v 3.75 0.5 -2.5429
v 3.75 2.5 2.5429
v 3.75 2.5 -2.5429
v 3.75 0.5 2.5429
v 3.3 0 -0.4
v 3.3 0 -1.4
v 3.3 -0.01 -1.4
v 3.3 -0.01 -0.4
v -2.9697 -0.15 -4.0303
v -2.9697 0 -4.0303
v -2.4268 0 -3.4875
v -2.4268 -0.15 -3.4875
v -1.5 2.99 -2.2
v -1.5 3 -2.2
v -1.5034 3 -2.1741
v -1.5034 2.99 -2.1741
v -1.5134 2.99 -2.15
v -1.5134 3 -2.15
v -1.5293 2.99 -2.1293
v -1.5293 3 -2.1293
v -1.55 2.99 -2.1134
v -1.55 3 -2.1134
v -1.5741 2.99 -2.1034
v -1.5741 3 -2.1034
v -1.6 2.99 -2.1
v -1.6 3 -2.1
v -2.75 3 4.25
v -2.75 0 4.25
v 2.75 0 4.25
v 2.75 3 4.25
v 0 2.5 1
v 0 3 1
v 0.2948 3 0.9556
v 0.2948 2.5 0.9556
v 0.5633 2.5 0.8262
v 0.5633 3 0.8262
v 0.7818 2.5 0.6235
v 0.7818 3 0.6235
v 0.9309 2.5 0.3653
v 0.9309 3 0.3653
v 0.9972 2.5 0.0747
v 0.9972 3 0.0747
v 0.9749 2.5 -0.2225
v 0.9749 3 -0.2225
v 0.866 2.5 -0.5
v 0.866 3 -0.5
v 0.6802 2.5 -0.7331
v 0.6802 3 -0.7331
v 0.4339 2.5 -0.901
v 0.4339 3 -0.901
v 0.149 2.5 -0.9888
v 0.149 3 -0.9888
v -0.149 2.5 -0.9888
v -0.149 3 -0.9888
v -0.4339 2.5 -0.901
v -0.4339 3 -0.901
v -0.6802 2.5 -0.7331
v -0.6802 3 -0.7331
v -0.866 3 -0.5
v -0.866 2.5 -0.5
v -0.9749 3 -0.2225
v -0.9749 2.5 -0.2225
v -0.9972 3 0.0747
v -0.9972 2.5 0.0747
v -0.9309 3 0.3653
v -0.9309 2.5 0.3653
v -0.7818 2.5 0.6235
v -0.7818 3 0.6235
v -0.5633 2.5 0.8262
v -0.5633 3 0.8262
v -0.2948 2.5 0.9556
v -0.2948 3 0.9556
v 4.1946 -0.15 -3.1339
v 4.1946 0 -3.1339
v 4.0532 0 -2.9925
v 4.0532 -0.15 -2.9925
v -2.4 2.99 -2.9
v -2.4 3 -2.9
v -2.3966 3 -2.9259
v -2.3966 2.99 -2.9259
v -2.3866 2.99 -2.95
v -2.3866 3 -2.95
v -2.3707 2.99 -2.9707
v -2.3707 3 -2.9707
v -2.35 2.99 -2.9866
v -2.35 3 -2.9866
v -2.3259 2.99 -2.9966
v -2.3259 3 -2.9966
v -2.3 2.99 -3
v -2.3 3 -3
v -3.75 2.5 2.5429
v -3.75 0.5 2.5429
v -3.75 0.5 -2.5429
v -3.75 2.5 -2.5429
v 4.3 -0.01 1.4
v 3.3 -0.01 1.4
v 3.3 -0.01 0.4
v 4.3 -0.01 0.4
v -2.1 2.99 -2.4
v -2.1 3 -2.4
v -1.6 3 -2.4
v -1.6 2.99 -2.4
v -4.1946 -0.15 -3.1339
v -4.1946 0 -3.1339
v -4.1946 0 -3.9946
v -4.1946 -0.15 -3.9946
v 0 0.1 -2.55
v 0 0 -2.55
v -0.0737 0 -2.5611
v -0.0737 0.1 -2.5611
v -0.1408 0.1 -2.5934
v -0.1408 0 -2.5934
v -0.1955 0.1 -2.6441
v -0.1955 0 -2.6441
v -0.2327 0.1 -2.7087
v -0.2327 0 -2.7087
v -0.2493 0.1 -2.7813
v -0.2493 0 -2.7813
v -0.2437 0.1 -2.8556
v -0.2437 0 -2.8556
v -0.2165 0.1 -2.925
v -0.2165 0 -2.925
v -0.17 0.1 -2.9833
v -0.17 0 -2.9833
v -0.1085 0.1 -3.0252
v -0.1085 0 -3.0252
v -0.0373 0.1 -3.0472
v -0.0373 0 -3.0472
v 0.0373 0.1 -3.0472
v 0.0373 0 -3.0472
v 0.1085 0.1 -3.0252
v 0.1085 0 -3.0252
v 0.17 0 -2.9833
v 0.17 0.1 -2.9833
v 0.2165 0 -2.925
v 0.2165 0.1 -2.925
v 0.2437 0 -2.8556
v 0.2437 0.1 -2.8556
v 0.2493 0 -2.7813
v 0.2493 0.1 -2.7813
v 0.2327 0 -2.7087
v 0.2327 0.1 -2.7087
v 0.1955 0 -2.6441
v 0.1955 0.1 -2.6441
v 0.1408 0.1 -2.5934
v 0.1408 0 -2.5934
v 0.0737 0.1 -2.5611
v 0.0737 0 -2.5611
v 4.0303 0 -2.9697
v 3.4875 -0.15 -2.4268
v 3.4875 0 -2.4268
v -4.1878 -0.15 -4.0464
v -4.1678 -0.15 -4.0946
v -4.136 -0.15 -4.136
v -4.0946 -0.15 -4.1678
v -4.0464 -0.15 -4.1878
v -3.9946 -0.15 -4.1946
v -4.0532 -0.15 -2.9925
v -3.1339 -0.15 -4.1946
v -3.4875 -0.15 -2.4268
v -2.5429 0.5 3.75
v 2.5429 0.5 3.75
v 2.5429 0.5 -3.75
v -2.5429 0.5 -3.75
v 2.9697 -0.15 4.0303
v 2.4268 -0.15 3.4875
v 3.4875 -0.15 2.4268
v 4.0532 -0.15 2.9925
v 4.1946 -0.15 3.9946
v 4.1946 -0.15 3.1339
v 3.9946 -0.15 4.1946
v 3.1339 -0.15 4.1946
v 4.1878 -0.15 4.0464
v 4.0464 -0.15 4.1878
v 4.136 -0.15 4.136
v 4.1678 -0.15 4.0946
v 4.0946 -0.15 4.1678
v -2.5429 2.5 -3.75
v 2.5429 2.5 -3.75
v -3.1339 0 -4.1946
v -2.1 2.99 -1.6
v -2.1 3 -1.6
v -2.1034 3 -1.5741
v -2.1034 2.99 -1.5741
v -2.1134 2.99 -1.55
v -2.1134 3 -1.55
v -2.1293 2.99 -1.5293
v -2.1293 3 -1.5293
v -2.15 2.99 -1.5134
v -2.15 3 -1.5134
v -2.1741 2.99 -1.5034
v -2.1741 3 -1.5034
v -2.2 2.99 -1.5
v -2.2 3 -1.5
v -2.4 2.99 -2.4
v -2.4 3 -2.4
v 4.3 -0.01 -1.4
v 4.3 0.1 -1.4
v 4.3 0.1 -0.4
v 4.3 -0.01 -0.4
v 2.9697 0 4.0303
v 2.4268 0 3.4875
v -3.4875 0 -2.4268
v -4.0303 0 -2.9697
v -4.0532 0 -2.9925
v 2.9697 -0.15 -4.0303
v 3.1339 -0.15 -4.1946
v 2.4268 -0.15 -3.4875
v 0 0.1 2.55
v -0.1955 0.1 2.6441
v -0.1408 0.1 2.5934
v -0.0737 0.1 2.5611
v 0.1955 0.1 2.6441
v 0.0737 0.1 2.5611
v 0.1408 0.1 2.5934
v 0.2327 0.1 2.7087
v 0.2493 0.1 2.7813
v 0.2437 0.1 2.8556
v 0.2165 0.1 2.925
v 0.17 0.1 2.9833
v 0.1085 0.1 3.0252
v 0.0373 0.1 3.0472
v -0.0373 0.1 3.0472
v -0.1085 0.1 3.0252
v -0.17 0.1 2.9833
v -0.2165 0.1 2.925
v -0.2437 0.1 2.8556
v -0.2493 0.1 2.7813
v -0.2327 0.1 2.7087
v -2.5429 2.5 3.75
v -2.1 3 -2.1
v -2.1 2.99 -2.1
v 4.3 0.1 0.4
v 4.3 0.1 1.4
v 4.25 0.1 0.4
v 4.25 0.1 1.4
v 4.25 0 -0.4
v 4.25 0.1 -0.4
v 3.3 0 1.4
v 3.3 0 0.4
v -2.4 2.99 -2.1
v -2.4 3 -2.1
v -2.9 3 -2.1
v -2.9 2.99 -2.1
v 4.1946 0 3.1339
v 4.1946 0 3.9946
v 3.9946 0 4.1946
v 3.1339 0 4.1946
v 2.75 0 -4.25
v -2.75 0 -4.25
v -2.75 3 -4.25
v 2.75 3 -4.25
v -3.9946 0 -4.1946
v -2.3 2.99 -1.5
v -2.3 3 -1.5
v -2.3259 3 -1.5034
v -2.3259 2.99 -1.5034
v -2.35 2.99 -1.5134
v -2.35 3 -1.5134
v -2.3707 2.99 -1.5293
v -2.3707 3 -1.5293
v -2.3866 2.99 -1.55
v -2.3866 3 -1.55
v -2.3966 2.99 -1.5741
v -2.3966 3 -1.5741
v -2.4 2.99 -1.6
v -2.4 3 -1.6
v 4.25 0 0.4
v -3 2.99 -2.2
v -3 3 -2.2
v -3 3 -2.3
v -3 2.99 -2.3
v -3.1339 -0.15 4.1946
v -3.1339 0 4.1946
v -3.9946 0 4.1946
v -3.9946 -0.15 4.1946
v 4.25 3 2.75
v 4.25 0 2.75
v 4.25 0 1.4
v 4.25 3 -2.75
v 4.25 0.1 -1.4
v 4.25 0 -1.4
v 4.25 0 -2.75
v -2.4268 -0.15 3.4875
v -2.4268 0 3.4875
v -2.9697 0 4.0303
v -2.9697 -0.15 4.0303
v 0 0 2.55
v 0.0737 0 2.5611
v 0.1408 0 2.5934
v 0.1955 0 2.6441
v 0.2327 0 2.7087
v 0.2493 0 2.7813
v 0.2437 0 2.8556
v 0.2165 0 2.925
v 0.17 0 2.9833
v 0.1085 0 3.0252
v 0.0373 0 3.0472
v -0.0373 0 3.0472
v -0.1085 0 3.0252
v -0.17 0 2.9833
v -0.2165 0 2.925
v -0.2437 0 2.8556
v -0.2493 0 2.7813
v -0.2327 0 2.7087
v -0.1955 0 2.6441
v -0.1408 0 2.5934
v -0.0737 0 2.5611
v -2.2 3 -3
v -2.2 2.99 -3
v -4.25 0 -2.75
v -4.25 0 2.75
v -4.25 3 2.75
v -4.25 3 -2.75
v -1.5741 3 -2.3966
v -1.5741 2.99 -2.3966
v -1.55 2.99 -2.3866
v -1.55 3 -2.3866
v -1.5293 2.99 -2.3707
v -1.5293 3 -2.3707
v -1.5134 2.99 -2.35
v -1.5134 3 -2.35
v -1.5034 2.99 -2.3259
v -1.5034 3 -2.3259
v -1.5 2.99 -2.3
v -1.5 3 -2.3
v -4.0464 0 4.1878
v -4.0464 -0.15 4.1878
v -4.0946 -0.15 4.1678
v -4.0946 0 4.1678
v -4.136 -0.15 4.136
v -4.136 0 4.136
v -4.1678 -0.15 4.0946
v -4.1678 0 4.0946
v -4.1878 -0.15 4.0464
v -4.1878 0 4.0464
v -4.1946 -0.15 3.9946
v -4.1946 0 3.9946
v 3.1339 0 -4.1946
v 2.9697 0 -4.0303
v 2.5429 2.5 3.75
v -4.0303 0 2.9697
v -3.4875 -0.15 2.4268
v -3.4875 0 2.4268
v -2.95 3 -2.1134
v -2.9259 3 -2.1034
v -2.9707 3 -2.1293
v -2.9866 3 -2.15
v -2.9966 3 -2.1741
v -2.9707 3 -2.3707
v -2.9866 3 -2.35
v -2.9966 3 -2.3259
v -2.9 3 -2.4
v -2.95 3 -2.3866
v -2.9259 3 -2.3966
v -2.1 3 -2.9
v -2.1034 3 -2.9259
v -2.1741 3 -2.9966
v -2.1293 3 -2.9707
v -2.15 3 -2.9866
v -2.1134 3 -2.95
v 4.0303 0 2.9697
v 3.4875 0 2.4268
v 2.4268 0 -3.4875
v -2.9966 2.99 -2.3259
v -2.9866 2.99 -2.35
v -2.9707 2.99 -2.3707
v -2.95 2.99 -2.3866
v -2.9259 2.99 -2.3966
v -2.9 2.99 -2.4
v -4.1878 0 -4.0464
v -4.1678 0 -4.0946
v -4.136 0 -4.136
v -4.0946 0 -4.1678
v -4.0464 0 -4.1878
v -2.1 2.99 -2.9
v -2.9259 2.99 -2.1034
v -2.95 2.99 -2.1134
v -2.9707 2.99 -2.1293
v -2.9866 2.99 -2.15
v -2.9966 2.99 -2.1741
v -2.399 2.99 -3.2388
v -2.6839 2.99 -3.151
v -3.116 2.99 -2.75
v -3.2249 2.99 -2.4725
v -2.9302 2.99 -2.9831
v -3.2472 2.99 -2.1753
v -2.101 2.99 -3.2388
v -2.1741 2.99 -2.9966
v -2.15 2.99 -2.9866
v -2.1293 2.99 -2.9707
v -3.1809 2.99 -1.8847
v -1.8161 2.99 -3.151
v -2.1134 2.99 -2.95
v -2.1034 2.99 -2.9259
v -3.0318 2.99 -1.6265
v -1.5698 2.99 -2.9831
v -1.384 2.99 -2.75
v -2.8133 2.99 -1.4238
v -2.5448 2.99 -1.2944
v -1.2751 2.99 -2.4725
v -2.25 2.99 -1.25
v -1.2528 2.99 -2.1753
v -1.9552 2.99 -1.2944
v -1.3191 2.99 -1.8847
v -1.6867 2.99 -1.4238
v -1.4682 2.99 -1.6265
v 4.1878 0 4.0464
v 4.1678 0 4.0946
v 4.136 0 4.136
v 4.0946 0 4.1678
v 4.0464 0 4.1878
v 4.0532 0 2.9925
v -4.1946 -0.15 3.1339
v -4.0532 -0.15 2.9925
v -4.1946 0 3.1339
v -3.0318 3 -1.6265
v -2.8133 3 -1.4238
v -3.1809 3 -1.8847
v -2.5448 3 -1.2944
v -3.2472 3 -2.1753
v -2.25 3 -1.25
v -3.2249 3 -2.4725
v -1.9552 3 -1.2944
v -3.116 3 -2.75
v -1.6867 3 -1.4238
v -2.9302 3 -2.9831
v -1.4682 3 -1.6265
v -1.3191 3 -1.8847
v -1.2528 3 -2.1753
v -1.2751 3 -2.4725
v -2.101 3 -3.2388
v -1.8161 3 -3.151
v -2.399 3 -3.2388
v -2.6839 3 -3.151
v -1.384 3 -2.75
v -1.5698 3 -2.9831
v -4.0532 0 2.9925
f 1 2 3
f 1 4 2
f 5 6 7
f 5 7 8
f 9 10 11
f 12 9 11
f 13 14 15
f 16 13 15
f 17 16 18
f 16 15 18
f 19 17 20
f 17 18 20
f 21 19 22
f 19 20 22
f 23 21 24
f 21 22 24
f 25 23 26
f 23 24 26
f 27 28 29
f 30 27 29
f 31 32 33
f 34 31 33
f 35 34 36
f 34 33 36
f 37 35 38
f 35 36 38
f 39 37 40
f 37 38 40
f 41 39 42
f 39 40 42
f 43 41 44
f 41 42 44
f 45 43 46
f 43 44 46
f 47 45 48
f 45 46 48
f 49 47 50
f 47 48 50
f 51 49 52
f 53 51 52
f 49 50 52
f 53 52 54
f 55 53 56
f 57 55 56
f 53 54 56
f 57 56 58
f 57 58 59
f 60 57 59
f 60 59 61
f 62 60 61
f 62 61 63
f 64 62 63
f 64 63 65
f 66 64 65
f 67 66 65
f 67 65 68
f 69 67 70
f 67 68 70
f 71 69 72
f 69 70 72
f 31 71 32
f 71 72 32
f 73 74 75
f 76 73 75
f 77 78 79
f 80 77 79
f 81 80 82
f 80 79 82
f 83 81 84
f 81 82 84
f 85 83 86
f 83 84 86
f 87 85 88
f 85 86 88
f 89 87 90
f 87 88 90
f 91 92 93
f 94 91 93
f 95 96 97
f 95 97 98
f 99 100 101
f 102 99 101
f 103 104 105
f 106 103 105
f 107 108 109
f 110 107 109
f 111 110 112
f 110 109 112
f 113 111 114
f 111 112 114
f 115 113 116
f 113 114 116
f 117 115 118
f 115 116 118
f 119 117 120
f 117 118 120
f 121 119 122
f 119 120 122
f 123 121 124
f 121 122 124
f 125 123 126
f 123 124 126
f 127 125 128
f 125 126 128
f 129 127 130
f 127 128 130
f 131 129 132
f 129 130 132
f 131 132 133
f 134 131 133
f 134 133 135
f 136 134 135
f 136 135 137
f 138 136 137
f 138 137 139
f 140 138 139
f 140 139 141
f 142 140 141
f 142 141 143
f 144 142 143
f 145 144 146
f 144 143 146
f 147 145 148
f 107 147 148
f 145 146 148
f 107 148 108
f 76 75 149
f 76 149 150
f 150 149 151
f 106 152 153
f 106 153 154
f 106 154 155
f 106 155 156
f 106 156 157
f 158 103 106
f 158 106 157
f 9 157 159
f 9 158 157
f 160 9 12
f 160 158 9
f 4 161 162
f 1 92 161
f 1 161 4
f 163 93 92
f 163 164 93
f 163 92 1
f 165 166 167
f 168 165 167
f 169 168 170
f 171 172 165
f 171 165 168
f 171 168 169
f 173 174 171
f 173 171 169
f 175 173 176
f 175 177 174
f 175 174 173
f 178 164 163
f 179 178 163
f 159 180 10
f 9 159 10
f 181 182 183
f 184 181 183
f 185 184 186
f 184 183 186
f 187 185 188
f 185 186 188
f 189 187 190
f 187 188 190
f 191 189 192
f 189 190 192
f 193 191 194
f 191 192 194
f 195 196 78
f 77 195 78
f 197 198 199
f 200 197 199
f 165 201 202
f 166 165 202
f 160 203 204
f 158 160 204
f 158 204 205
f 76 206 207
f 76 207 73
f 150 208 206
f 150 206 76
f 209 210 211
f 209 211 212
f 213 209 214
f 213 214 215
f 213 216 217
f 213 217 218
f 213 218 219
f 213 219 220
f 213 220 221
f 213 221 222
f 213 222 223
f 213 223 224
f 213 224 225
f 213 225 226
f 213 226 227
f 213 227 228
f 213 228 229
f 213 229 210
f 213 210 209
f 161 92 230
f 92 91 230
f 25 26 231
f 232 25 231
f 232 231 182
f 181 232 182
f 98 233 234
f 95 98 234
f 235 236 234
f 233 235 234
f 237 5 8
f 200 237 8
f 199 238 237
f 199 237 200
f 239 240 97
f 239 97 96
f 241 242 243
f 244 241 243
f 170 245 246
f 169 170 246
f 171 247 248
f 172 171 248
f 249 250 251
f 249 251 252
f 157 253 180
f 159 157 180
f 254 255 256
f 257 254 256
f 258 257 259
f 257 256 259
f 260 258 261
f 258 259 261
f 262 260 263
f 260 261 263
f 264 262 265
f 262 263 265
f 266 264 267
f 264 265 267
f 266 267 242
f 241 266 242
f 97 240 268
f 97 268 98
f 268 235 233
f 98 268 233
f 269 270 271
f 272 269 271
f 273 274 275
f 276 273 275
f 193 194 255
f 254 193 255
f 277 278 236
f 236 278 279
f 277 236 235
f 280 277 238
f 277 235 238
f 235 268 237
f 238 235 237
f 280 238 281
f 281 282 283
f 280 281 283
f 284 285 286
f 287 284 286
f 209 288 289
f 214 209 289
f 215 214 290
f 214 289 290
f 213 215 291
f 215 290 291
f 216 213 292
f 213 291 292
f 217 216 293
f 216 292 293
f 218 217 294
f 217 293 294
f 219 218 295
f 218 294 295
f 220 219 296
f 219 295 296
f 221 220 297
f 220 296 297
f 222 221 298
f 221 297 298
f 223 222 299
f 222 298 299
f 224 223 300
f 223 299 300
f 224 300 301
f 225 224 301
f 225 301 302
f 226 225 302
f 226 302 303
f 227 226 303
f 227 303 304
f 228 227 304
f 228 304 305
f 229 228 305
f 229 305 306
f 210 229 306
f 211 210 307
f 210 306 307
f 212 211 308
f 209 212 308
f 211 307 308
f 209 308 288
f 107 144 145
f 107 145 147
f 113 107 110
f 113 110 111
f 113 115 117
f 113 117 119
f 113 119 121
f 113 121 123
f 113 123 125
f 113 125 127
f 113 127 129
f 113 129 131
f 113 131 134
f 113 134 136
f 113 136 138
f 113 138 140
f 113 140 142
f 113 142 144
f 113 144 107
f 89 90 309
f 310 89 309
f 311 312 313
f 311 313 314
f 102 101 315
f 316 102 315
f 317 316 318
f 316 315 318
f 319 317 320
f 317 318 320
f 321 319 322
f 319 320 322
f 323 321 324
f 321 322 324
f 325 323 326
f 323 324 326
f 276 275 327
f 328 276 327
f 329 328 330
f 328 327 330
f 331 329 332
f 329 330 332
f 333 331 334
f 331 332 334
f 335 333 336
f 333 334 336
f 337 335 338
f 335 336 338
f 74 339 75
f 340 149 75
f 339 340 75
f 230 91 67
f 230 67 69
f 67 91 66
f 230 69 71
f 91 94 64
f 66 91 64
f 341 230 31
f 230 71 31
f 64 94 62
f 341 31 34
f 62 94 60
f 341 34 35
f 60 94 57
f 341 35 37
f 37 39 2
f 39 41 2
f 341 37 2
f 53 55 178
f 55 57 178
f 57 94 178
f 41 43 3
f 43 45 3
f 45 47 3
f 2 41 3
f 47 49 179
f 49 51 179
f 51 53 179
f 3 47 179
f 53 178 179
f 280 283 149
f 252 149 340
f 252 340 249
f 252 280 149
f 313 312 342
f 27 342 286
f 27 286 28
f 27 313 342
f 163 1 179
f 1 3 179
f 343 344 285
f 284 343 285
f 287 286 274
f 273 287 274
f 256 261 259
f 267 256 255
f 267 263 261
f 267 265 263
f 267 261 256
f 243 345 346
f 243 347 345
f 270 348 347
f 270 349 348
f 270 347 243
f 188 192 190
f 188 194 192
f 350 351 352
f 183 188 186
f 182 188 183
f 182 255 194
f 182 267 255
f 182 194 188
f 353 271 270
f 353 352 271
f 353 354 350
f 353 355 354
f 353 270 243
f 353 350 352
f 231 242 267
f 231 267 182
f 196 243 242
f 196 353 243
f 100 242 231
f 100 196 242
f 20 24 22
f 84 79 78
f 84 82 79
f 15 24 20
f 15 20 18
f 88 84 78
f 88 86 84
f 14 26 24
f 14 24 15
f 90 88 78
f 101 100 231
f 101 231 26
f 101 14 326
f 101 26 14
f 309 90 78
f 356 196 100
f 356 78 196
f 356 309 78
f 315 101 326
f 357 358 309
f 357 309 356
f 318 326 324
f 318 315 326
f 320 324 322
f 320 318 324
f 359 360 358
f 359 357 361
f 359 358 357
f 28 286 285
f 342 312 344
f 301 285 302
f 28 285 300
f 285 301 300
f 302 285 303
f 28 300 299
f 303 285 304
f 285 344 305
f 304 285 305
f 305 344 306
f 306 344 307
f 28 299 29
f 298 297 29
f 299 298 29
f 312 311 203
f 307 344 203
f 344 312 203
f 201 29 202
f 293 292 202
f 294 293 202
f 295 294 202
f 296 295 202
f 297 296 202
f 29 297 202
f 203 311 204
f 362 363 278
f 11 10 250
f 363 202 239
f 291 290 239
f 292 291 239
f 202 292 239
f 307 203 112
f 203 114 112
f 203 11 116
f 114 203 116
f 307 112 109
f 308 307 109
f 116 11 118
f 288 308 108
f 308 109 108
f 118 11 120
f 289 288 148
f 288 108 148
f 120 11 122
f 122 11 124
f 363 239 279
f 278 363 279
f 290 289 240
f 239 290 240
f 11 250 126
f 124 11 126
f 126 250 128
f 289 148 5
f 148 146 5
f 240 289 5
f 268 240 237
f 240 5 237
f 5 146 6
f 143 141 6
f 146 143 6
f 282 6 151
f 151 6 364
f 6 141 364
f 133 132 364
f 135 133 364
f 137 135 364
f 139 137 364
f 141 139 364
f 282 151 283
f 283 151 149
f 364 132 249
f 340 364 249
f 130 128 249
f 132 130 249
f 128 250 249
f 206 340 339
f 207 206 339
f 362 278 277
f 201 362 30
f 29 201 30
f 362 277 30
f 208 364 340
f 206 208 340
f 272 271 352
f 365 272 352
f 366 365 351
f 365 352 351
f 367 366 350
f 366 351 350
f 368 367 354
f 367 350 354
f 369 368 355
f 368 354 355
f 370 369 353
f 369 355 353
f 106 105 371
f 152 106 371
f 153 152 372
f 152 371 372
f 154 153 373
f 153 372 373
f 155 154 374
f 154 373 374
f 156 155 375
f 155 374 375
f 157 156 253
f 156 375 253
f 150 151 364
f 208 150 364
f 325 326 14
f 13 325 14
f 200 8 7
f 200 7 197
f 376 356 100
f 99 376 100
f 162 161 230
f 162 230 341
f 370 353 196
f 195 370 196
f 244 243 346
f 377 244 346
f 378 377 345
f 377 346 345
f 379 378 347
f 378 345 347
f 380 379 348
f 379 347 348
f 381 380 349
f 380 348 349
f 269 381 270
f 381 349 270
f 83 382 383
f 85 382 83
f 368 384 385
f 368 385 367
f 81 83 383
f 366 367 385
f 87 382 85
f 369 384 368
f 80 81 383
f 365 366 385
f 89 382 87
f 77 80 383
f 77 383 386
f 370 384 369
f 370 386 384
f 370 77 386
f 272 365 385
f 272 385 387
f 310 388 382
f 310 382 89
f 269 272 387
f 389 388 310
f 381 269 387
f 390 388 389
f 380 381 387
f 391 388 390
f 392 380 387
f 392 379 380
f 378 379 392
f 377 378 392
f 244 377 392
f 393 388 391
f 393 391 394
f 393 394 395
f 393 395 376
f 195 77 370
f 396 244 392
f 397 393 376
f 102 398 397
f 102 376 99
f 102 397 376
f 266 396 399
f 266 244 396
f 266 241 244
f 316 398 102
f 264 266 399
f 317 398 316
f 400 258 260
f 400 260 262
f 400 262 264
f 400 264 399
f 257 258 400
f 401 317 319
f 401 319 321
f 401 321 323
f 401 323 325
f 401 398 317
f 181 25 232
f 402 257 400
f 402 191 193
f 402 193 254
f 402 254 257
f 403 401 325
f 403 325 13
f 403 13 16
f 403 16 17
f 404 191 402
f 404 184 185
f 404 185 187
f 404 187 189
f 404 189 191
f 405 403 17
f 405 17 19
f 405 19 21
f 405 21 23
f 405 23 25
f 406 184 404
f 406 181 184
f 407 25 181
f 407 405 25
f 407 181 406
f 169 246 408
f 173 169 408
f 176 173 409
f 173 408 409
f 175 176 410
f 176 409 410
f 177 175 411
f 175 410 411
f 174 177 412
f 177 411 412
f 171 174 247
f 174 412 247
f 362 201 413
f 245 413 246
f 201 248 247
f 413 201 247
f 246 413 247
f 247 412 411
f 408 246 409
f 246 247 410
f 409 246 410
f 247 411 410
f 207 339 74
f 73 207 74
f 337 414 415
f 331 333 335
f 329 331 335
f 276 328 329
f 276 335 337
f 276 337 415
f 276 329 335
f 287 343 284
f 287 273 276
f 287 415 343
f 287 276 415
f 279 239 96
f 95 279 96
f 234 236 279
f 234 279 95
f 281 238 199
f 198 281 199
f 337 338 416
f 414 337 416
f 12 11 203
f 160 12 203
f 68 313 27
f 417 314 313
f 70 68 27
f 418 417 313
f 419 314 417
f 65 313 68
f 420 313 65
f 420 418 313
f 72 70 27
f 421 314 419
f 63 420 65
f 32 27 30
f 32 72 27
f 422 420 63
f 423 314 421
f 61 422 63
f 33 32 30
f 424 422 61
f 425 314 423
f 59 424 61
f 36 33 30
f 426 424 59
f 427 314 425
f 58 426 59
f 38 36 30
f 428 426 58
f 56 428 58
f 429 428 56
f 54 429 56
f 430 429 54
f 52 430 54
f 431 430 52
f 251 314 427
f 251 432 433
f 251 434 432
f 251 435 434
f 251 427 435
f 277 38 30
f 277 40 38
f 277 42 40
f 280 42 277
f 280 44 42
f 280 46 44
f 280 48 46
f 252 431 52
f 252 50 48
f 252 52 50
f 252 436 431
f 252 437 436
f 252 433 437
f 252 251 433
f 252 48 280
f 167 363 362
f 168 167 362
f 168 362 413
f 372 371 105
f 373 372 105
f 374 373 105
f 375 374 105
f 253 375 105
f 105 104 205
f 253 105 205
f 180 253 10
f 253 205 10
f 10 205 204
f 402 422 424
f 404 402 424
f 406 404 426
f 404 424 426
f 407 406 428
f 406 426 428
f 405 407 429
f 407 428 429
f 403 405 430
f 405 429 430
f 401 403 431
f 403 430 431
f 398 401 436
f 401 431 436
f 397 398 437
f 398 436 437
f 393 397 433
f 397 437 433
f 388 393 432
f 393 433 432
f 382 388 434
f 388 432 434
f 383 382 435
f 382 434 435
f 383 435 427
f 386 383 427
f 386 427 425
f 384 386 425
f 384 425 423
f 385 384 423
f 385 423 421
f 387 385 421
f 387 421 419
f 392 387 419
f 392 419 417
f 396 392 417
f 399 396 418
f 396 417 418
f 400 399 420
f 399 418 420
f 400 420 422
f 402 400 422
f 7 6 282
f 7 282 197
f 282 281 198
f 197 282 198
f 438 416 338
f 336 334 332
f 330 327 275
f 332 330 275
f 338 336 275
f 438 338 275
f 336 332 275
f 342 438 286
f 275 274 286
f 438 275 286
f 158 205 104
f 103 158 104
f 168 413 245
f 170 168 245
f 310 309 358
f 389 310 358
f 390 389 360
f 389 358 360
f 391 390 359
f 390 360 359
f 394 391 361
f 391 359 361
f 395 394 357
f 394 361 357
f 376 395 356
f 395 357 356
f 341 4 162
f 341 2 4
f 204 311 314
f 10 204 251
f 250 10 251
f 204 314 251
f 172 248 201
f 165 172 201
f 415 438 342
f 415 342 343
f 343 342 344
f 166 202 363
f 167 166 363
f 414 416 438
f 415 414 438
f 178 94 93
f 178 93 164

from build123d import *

# Parameters (mm, degrees)
SKETCH1_W                = 8.5
SKETCH1_H                = 8.5
BOSS_EXTRUDE1_DEPTH      = 3
CUT_EXTRUDE1_DEPTH       = 3
SHELL2_T                 = 0.5
SKETCH3_R                = 1
CUT_EXTRUDE2_DEPTH       = 0.5
BOSS_EXTRUDE2_DEPTH      = 0.15
SKETCH5_R                = 1
CUT_EXTRUDE3_DEPTH       = 0.01
BOSS_EXTRUDE3_DEPTH      = 0.01
BOSS_EXTRUDE3_DEPTH_BACK = 0.1
SKETCH6_W                = 1
SKETCH6_H                = 1
SKETCH7_R                = 0.25
CUT_EXTRUDE4_DEPTH       = 0.1


with BuildPart() as part:
    # Sketch1 → Boss-Extrude1 (new body)
    with BuildSketch(Plane(origin=(0, 0, 0), x_dir=(1, 0, 0), z_dir=(0, 1, 0))):
        Rectangle(SKETCH1_W, SKETCH1_H)
    extrude(amount=BOSS_EXTRUDE1_DEPTH)

    # Sketch2 → Cut-Extrude1 (cut)
    with BuildSketch(Plane(origin=(0, 3, 0), x_dir=(1, 0, 0), z_dir=(0, 1, 0))):
        Polygon((-4.25, 2.75), (-2.75, 4.25), (-4.25, 4.25), align=None)
        Polygon((4.25, 4.25), (4.25, 2.75), (2.75, 4.25), align=None)
        Polygon((4.25, -2.75), (2.75, -4.25), (4.25, -4.25), align=None)
        Polygon((-4.25, -4.25), (-4.25, -2.75), (-2.75, -4.25), align=None)
    extrude(amount=-CUT_EXTRUDE1_DEPTH, mode=Mode.SUBTRACT)

    # Shell2 (no face opened: a closed hollow body)
    add(offset(amount=-SHELL2_T, mode=Mode.PRIVATE), mode=Mode.SUBTRACT)

    # Sketch3 → Cut-Extrude2 (cut)
    with BuildSketch(Plane(origin=(0, 3, 0), x_dir=(1, 0, 0), z_dir=(0, 1, 0))):
        Circle(SKETCH3_R)
    extrude(amount=-CUT_EXTRUDE2_DEPTH, mode=Mode.SUBTRACT)

    # Sketch4 → Boss-Extrude2 (add)
    with BuildSketch(Plane.XZ):
        with BuildLine():
            Line((-4.194600731, 3.13394056), (-3.48749395, 2.426833778))
            Line((-3.48749395, 2.426833778), (-2.426833778, 3.48749395))
            Line((-2.426833778, 3.48749395), (-3.13394056, 4.194600731))
            Line((-3.13394056, 4.194600731), (-3.994600731, 4.194600731))
            ThreePointArc((-3.994600731, 4.194600731), (-4.136022088, 4.136022088), (-4.194600731, 3.994600731))
            Line((-4.194600731, 3.994600731), (-4.194600731, 3.13394056))
        make_face()
        with BuildLine():
            Line((4.194600731, 3.13394056), (4.194600731, 3.994600731))
            ThreePointArc((4.194600731, 3.994600731), (4.136022088, 4.136022088), (3.994600731, 4.194600731))
            Line((3.994600731, 4.194600731), (3.13394056, 4.194600731))
            Line((3.13394056, 4.194600731), (2.426833778, 3.48749395))
            Line((2.426833778, 3.48749395), (3.48749395, 2.426833778))
            Line((3.48749395, 2.426833778), (4.194600731, 3.13394056))
        make_face()
        Polygon((4.194600731, -3.13394056), (3.48749395, -2.426833778), (2.426833778, -3.48749395), (3.13394056, -4.194600731), align=None)
        with BuildLine():
            Line((-4.194600731, -3.13394056), (-4.194600731, -3.994600731))
            ThreePointArc((-4.194600731, -3.994600731), (-4.136022088, -4.136022088), (-3.994600731, -4.194600731))
            Line((-3.994600731, -4.194600731), (-3.13394056, -4.194600731))
            Line((-3.13394056, -4.194600731), (-2.426833778, -3.48749395))
            Line((-2.426833778, -3.48749395), (-3.48749395, -2.426833778))
            Line((-3.48749395, -2.426833778), (-4.194600731, -3.13394056))
        make_face()
    extrude(amount=BOSS_EXTRUDE2_DEPTH)

    # Sketch5 → Cut-Extrude3 (cut)
    with BuildSketch(Plane(origin=(0, 3, 0), x_dir=(1, 0, 0), z_dir=(0, 1, 0))):
        with Locations((-2.25, 2.25)):
            Circle(SKETCH5_R)
        with BuildLine():
            ThreePointArc((-3, 2.3), (-2.970710678, 2.370710678), (-2.9, 2.4))
            Line((-2.9, 2.4), (-2.4, 2.4))
            Line((-2.4, 2.4), (-2.4, 2.9))
            ThreePointArc((-2.4, 2.9), (-2.370710678, 2.970710678), (-2.3, 3))
            Line((-2.3, 3), (-2.2, 3))
            ThreePointArc((-2.2, 3), (-2.129289322, 2.970710678), (-2.1, 2.9))
            Line((-2.1, 2.9), (-2.1, 2.4))
            Line((-2.1, 2.4), (-1.6, 2.4))
            ThreePointArc((-1.6, 2.4), (-1.529289322, 2.370710678), (-1.5, 2.3))
            Line((-1.5, 2.3), (-1.5, 2.2))
            ThreePointArc((-1.5, 2.2), (-1.529289322, 2.129289322), (-1.6, 2.1))
            Line((-1.6, 2.1), (-2.1, 2.1))
            Line((-2.1, 2.1), (-2.1, 1.6))
            ThreePointArc((-2.1, 1.6), (-2.129289322, 1.529289322), (-2.2, 1.5))
            Line((-2.2, 1.5), (-2.3, 1.5))
            ThreePointArc((-2.3, 1.5), (-2.370710678, 1.529289322), (-2.4, 1.6))
            Line((-2.4, 1.6), (-2.4, 2.1))
            Line((-2.4, 2.1), (-2.9, 2.1))
            ThreePointArc((-2.9, 2.1), (-2.970710678, 2.129289322), (-3, 2.2))
            Line((-3, 2.2), (-3, 2.3))
        make_face(mode=Mode.SUBTRACT)
    extrude(amount=-CUT_EXTRUDE3_DEPTH, mode=Mode.SUBTRACT)

    # Sketch6 → Boss-Extrude3 (add, two sides: drawn at the far end of the back side and taken through both)
    with BuildSketch(Plane.XZ.offset(-BOSS_EXTRUDE3_DEPTH_BACK)):
        with Locations((3.8, 0.9)):
            Rectangle(SKETCH6_W, SKETCH6_H)
        with Locations((3.8, -0.9)):
            Rectangle(SKETCH6_W, SKETCH6_H)
    extrude(amount=BOSS_EXTRUDE3_DEPTH + BOSS_EXTRUDE3_DEPTH_BACK)

    # Sketch7 → Cut-Extrude4 (cut)
    with BuildSketch(Plane.XZ):
        with Locations((0, 2.8)):
            Circle(SKETCH7_R)
        with Locations((0, -2.8)):
            Circle(SKETCH7_R)
    extrude(amount=-CUT_EXTRUDE4_DEPTH, mode=Mode.SUBTRACT)


solid = part.part
